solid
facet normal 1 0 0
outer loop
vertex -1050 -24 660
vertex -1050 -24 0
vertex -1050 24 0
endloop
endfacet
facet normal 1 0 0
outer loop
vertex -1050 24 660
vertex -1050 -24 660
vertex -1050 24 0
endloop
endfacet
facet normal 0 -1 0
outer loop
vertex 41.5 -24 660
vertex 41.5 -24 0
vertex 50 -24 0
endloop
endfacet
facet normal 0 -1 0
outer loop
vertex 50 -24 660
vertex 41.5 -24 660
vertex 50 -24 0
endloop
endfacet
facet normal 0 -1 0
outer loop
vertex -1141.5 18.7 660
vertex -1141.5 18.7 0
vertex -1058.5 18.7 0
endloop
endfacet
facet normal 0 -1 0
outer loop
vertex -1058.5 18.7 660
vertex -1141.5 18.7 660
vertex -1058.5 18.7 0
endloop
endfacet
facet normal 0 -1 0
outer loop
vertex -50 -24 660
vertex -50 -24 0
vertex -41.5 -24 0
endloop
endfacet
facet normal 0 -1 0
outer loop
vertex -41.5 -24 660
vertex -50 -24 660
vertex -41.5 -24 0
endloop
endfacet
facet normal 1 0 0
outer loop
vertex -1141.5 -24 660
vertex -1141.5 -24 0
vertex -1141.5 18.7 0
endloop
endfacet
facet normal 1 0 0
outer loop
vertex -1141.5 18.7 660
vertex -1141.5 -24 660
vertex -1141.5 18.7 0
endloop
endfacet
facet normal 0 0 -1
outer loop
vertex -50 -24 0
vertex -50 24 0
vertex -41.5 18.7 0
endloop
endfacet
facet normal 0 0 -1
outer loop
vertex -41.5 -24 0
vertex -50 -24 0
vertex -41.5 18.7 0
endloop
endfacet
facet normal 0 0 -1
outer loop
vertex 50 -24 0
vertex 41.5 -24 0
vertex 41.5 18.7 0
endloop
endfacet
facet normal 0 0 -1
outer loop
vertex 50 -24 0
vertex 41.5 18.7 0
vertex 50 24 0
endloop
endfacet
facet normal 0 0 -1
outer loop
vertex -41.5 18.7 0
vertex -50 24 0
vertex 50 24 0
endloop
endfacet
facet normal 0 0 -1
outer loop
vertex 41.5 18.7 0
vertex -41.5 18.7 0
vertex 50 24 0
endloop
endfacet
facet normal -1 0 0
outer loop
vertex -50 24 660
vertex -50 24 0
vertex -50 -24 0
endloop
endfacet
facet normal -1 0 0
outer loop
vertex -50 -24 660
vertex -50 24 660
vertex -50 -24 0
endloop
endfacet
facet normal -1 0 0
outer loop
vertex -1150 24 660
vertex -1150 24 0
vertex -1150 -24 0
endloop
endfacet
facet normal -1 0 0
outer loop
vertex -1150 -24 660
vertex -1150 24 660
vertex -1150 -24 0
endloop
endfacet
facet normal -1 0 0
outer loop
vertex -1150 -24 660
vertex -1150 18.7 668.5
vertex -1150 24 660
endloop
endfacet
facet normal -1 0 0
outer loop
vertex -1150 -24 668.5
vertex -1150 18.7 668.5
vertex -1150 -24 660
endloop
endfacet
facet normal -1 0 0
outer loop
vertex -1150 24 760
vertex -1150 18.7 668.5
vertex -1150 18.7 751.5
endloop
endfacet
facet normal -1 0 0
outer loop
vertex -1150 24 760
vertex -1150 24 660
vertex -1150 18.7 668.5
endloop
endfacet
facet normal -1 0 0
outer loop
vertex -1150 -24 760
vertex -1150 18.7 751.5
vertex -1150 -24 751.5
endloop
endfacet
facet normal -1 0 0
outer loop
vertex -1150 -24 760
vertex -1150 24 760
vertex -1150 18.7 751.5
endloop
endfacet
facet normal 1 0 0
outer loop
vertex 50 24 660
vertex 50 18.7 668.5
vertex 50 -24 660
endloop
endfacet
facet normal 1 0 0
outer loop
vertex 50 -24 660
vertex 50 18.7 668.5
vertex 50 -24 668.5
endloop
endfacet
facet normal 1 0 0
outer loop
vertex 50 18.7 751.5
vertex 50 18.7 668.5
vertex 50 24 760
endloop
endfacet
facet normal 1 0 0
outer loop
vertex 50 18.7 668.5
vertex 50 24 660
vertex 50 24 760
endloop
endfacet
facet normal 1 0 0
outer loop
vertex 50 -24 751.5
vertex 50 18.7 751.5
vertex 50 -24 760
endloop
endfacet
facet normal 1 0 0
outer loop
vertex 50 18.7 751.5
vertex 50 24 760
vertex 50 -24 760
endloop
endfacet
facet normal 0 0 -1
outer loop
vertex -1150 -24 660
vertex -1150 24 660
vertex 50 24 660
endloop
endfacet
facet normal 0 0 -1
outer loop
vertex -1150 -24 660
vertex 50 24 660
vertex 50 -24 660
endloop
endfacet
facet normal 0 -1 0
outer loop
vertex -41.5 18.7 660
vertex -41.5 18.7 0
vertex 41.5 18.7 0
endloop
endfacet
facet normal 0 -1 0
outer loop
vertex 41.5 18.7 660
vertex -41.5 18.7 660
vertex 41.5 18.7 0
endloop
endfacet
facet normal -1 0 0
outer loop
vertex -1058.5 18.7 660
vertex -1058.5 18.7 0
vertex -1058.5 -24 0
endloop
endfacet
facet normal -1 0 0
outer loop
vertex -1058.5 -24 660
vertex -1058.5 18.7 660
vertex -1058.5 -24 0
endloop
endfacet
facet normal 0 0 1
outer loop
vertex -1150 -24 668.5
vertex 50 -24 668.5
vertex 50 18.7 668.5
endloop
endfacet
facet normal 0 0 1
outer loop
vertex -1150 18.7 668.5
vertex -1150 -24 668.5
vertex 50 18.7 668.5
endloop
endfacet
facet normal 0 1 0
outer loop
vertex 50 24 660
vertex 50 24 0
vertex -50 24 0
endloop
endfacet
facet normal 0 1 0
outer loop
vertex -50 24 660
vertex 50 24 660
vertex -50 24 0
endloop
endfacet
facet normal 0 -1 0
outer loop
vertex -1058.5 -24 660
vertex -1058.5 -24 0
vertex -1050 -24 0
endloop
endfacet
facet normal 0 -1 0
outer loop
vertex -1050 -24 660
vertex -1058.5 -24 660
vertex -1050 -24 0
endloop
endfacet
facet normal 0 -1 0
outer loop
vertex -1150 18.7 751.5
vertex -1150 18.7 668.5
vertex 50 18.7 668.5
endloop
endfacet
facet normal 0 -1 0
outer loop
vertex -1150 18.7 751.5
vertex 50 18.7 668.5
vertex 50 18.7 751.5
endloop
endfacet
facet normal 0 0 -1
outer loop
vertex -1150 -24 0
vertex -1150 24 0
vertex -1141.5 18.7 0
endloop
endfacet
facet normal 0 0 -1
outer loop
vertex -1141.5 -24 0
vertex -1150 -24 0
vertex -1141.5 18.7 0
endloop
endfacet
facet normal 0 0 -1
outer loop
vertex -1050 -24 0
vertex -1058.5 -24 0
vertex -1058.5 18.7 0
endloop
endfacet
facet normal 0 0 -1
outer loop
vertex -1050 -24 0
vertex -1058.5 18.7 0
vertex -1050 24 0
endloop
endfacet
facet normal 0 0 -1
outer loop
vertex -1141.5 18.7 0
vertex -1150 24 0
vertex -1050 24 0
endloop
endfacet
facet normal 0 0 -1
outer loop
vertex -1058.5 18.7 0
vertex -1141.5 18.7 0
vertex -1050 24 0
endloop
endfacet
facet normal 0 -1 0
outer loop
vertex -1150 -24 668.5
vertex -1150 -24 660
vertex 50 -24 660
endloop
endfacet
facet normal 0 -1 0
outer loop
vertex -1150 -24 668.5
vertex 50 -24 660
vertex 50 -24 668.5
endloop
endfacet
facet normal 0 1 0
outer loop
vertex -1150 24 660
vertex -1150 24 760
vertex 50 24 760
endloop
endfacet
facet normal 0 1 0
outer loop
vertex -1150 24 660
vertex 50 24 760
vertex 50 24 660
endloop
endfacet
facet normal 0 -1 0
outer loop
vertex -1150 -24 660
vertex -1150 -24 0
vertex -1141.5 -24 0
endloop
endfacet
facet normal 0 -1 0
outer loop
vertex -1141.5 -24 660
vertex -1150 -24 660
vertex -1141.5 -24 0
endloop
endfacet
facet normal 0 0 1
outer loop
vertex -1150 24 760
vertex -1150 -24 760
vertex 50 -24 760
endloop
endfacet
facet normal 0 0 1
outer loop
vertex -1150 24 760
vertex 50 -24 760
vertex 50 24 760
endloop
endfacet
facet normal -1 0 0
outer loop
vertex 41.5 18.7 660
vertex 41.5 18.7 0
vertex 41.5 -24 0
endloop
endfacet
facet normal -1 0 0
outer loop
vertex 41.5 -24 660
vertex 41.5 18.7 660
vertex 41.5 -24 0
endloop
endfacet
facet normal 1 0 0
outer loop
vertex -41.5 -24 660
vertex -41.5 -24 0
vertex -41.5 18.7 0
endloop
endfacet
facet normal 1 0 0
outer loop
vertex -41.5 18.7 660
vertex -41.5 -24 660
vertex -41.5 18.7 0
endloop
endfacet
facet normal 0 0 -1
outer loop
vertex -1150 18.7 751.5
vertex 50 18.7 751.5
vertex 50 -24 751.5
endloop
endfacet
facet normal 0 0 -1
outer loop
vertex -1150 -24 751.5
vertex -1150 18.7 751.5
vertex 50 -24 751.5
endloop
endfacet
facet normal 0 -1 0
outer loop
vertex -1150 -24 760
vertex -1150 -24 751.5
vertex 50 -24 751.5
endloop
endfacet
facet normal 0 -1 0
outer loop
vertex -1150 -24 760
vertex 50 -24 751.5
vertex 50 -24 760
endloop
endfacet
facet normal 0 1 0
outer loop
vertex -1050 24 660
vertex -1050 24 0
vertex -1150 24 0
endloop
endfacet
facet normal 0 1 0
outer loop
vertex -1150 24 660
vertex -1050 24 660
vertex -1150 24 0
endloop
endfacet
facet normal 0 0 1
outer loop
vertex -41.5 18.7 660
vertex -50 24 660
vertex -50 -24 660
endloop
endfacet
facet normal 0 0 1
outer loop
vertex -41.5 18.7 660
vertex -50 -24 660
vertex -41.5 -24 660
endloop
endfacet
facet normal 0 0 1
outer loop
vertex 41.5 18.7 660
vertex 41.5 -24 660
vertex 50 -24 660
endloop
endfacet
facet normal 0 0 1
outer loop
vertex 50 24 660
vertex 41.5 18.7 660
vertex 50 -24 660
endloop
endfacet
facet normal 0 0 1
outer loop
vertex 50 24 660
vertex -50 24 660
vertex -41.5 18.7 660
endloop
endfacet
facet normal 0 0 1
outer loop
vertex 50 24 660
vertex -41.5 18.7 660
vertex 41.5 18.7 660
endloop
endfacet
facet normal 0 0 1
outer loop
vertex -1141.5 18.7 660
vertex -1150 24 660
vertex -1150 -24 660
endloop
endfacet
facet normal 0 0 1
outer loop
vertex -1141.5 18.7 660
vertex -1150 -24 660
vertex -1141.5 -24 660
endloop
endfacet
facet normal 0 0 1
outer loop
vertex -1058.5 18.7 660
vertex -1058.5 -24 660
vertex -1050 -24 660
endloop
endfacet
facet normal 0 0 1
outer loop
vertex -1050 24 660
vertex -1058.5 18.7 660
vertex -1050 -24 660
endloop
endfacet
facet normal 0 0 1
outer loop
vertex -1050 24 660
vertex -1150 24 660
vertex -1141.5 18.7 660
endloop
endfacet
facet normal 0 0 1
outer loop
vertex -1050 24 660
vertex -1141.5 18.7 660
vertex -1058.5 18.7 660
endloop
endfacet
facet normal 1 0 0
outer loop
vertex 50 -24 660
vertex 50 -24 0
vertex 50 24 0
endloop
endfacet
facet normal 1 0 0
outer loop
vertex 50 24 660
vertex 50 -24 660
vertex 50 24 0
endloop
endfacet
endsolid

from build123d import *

# Parameters (mm, degrees)
F2_DEPTH = 660
F5_DEPTH = 1200


with BuildPart() as f2:
    # F1 (on Top) → F2 (new body)
    with BuildSketch(Plane.XY):
        Polygon((-1058.5, -24), (-1050, -24), (-1050, 24), (-1150, 24), (-1150, -24), (-1141.5, -24), (-1141.5, 18.7), (-1058.5, 18.7), align=None)
    extrude(amount=F2_DEPTH)


with BuildPart() as f2b:
    # F0 (on Top) → F2, piece 2 (new body)
    with BuildSketch(Plane.XY):
        Polygon((41.5, -24), (50, -24), (50, 24), (-50, 24), (-50, -24), (-41.5, -24), (-41.5, 18.7), (41.5, 18.7), align=None)
    extrude(amount=F2_DEPTH)


with BuildPart() as f5:
    # F4 (on offset) → F5 (new body, through all)
    with BuildSketch(Plane(origin=(-1150, 0, 0), x_dir=(0, -1, 0), z_dir=(-1, 0, 0))):
        Polygon((-24, 760), (-24, 660), (24, 660), (24, 668.5), (-18.7, 668.5), (-18.7, 751.5), (24, 751.5), (24, 760), align=None)
    extrude(amount=-F5_DEPTH)


solid = Compound([f2.part, f2b.part, f5.part])
